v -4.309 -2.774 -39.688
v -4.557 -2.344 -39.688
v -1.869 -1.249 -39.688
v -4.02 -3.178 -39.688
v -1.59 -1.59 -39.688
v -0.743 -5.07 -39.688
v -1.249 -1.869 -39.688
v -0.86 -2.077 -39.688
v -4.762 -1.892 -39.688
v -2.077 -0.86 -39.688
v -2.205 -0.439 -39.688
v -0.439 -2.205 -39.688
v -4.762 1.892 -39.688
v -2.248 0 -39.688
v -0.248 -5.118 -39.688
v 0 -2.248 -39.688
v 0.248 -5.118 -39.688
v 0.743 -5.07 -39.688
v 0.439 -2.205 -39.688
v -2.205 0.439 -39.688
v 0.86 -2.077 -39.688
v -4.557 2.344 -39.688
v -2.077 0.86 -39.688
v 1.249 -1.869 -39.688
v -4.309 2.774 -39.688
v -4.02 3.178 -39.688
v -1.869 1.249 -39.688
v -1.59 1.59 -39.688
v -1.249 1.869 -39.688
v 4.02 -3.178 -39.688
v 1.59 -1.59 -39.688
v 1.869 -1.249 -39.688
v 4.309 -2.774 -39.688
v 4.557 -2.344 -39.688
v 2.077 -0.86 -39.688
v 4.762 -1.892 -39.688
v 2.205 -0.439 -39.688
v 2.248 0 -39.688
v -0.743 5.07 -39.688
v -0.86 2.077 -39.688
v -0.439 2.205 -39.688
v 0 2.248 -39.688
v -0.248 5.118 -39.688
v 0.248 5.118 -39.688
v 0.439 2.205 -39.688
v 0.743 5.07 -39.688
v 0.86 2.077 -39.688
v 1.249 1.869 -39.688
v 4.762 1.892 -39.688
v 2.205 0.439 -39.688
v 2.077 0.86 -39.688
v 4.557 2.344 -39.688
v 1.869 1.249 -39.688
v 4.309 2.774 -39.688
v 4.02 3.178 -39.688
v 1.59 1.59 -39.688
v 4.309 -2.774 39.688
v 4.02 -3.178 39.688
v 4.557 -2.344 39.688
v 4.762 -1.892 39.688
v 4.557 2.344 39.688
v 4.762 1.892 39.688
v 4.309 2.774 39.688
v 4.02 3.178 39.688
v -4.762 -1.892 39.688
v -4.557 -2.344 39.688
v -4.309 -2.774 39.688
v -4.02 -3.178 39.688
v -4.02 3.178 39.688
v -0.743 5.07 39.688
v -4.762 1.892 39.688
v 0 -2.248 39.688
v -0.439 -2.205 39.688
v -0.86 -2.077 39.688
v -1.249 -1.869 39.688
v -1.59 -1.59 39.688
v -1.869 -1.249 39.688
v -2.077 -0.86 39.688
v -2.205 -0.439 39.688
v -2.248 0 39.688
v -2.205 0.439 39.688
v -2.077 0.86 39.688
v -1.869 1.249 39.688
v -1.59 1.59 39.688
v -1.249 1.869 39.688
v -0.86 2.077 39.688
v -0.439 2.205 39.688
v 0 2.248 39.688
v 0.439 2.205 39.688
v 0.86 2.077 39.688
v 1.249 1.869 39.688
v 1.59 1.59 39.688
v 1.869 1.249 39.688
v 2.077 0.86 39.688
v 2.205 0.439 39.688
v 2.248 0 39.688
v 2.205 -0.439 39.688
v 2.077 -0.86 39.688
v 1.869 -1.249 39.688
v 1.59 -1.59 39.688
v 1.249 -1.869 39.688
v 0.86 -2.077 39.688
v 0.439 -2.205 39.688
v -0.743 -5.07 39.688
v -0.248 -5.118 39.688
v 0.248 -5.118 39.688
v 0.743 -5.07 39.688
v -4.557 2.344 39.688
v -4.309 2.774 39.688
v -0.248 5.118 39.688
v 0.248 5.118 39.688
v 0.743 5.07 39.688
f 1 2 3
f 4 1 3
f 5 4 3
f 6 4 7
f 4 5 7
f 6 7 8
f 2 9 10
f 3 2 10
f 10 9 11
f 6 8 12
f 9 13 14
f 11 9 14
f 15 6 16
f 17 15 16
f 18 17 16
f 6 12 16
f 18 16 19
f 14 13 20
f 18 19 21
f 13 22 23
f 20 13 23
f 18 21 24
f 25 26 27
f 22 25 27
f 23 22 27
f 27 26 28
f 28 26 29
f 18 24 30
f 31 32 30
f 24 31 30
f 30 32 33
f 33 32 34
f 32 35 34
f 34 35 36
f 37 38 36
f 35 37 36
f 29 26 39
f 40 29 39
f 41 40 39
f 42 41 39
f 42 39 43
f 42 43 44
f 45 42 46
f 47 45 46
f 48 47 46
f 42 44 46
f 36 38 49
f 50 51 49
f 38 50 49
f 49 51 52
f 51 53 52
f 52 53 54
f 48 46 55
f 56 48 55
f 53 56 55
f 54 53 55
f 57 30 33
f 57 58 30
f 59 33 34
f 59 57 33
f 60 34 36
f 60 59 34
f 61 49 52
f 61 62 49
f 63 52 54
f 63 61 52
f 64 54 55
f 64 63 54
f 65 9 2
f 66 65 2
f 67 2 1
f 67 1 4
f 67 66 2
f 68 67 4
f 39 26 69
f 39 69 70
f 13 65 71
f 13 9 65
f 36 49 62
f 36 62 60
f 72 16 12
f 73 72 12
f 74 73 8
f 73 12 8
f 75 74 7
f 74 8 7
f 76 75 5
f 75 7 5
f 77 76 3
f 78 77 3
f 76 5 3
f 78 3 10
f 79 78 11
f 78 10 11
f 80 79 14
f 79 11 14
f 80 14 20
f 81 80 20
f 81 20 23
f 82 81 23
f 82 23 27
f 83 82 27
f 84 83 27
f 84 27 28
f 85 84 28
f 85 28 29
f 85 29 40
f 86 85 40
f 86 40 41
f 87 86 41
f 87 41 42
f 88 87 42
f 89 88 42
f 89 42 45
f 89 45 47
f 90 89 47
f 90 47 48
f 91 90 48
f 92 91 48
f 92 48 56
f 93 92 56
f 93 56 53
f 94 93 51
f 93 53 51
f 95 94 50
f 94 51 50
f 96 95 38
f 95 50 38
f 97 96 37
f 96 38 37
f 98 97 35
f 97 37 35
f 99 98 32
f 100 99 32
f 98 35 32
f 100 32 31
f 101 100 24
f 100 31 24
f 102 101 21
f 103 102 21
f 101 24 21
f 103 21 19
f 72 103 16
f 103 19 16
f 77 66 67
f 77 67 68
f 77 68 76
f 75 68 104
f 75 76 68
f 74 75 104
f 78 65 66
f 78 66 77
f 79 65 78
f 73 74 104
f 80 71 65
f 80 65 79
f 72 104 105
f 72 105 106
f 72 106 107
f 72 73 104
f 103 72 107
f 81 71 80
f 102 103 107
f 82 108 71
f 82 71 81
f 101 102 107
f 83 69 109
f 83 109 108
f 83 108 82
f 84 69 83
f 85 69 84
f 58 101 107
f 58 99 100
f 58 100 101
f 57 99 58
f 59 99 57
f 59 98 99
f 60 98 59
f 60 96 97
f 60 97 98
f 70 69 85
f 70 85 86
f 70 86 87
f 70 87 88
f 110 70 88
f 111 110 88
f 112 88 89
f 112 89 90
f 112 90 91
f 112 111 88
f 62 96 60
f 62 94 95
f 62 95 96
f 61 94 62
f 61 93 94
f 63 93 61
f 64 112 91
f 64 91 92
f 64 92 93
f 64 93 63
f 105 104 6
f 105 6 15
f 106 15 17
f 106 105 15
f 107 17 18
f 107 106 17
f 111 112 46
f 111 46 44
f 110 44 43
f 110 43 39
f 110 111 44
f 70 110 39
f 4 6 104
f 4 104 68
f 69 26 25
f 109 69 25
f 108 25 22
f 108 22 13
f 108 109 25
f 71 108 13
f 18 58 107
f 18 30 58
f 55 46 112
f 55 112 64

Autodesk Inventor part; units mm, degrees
ref_plane "YZ Plane" through (0, 0, 0) normal (1, 0, 0) x (0, 1, 0)
ref_plane "XZ Plane" through (0, 0, 0) normal (0, 1, 0) x (-1, 0, 0)
ref_plane "XY Plane" through (0, 0, 0) normal (0, 0, 1) x (1, 0, 0)
sketch "Sketch1" plane through (0, 0, 0) normal (0, 0, 1) x (1, 0, 0)
  line L0 (-4.7625, -2.7496) -> (-4.7625, 2.7496)
  line L1 (-4.7625, 2.7496) -> (0, 5.4993)
  line L2 (0, 5.4993) -> (4.7625, 2.7496)
  line L3 (4.7625, 2.7496) -> (4.7625, -2.7496)
  line L4 (4.7625, -2.7496) -> (0, -5.4993)
  line L5 (0, -5.4993) -> (-4.7625, -2.7496)
  point P0 (0, 0)
  point P1 (0, 0)
  dimension "Size" = 9.525
extrude "Extrusion1" add sketch "Sketch1" along normal mid plane 79.375
sketch "Sketch3" plane through (0, 0, 39.6875) normal (0, 0, 1) x (1, 0, 0)
  line L0 (-4.7625, 2.7496) -> (0, 5.4993) construction
  line L1 (0, 5.4993) -> (4.7625, 2.7496) construction
  line L2 (4.7625, 2.7496) -> (4.7625, -2.7496) construction
  line L3 (4.7625, -2.7496) -> (0, -5.4993) construction
  line L4 (0, -5.4993) -> (-4.7625, -2.7496) construction
  line L5 (-4.7625, -2.7496) -> (-4.7625, 2.7496) construction
  point P0 (0, 0)
hole "Hole1" at (0, 0, 39.6875) direction (0, 0, -1) diameter 4.4958 end through all
sketch "Sketch4" plane through (0, 0, 39.6875) normal (0, 0, 1) x (1, 0, 0)
  circle A0 centre (0, 0) radius 2.2479 construction
  line L0 (-4.7625, 2.7496) -> (0, 5.4993) construction
  line L1 (0, 5.4993) -> (4.7625, 2.7496) construction
  line L2 (4.7625, 2.7496) -> (4.7625, -2.7496) construction
  line L3 (4.7625, -2.7496) -> (0, -5.4993) construction
  line L4 (0, -5.4993) -> (-4.7625, -2.7496) construction
  line L5 (-4.7625, -2.7496) -> (-4.7625, 2.7496) construction
  circle A1 centre (0, 0) radius 5.1245
  circle A2 centre (0, 0) radius 8.89
  dimension "thunder" = 10.2489
  dimension "d16" = 17.78
extrude "Extrusion3" cut sketch "Sketch4" against normal through all
equation "\"bearing\" = 25.4"
properties part number "GP1-005" material "Aluminum 6061"
